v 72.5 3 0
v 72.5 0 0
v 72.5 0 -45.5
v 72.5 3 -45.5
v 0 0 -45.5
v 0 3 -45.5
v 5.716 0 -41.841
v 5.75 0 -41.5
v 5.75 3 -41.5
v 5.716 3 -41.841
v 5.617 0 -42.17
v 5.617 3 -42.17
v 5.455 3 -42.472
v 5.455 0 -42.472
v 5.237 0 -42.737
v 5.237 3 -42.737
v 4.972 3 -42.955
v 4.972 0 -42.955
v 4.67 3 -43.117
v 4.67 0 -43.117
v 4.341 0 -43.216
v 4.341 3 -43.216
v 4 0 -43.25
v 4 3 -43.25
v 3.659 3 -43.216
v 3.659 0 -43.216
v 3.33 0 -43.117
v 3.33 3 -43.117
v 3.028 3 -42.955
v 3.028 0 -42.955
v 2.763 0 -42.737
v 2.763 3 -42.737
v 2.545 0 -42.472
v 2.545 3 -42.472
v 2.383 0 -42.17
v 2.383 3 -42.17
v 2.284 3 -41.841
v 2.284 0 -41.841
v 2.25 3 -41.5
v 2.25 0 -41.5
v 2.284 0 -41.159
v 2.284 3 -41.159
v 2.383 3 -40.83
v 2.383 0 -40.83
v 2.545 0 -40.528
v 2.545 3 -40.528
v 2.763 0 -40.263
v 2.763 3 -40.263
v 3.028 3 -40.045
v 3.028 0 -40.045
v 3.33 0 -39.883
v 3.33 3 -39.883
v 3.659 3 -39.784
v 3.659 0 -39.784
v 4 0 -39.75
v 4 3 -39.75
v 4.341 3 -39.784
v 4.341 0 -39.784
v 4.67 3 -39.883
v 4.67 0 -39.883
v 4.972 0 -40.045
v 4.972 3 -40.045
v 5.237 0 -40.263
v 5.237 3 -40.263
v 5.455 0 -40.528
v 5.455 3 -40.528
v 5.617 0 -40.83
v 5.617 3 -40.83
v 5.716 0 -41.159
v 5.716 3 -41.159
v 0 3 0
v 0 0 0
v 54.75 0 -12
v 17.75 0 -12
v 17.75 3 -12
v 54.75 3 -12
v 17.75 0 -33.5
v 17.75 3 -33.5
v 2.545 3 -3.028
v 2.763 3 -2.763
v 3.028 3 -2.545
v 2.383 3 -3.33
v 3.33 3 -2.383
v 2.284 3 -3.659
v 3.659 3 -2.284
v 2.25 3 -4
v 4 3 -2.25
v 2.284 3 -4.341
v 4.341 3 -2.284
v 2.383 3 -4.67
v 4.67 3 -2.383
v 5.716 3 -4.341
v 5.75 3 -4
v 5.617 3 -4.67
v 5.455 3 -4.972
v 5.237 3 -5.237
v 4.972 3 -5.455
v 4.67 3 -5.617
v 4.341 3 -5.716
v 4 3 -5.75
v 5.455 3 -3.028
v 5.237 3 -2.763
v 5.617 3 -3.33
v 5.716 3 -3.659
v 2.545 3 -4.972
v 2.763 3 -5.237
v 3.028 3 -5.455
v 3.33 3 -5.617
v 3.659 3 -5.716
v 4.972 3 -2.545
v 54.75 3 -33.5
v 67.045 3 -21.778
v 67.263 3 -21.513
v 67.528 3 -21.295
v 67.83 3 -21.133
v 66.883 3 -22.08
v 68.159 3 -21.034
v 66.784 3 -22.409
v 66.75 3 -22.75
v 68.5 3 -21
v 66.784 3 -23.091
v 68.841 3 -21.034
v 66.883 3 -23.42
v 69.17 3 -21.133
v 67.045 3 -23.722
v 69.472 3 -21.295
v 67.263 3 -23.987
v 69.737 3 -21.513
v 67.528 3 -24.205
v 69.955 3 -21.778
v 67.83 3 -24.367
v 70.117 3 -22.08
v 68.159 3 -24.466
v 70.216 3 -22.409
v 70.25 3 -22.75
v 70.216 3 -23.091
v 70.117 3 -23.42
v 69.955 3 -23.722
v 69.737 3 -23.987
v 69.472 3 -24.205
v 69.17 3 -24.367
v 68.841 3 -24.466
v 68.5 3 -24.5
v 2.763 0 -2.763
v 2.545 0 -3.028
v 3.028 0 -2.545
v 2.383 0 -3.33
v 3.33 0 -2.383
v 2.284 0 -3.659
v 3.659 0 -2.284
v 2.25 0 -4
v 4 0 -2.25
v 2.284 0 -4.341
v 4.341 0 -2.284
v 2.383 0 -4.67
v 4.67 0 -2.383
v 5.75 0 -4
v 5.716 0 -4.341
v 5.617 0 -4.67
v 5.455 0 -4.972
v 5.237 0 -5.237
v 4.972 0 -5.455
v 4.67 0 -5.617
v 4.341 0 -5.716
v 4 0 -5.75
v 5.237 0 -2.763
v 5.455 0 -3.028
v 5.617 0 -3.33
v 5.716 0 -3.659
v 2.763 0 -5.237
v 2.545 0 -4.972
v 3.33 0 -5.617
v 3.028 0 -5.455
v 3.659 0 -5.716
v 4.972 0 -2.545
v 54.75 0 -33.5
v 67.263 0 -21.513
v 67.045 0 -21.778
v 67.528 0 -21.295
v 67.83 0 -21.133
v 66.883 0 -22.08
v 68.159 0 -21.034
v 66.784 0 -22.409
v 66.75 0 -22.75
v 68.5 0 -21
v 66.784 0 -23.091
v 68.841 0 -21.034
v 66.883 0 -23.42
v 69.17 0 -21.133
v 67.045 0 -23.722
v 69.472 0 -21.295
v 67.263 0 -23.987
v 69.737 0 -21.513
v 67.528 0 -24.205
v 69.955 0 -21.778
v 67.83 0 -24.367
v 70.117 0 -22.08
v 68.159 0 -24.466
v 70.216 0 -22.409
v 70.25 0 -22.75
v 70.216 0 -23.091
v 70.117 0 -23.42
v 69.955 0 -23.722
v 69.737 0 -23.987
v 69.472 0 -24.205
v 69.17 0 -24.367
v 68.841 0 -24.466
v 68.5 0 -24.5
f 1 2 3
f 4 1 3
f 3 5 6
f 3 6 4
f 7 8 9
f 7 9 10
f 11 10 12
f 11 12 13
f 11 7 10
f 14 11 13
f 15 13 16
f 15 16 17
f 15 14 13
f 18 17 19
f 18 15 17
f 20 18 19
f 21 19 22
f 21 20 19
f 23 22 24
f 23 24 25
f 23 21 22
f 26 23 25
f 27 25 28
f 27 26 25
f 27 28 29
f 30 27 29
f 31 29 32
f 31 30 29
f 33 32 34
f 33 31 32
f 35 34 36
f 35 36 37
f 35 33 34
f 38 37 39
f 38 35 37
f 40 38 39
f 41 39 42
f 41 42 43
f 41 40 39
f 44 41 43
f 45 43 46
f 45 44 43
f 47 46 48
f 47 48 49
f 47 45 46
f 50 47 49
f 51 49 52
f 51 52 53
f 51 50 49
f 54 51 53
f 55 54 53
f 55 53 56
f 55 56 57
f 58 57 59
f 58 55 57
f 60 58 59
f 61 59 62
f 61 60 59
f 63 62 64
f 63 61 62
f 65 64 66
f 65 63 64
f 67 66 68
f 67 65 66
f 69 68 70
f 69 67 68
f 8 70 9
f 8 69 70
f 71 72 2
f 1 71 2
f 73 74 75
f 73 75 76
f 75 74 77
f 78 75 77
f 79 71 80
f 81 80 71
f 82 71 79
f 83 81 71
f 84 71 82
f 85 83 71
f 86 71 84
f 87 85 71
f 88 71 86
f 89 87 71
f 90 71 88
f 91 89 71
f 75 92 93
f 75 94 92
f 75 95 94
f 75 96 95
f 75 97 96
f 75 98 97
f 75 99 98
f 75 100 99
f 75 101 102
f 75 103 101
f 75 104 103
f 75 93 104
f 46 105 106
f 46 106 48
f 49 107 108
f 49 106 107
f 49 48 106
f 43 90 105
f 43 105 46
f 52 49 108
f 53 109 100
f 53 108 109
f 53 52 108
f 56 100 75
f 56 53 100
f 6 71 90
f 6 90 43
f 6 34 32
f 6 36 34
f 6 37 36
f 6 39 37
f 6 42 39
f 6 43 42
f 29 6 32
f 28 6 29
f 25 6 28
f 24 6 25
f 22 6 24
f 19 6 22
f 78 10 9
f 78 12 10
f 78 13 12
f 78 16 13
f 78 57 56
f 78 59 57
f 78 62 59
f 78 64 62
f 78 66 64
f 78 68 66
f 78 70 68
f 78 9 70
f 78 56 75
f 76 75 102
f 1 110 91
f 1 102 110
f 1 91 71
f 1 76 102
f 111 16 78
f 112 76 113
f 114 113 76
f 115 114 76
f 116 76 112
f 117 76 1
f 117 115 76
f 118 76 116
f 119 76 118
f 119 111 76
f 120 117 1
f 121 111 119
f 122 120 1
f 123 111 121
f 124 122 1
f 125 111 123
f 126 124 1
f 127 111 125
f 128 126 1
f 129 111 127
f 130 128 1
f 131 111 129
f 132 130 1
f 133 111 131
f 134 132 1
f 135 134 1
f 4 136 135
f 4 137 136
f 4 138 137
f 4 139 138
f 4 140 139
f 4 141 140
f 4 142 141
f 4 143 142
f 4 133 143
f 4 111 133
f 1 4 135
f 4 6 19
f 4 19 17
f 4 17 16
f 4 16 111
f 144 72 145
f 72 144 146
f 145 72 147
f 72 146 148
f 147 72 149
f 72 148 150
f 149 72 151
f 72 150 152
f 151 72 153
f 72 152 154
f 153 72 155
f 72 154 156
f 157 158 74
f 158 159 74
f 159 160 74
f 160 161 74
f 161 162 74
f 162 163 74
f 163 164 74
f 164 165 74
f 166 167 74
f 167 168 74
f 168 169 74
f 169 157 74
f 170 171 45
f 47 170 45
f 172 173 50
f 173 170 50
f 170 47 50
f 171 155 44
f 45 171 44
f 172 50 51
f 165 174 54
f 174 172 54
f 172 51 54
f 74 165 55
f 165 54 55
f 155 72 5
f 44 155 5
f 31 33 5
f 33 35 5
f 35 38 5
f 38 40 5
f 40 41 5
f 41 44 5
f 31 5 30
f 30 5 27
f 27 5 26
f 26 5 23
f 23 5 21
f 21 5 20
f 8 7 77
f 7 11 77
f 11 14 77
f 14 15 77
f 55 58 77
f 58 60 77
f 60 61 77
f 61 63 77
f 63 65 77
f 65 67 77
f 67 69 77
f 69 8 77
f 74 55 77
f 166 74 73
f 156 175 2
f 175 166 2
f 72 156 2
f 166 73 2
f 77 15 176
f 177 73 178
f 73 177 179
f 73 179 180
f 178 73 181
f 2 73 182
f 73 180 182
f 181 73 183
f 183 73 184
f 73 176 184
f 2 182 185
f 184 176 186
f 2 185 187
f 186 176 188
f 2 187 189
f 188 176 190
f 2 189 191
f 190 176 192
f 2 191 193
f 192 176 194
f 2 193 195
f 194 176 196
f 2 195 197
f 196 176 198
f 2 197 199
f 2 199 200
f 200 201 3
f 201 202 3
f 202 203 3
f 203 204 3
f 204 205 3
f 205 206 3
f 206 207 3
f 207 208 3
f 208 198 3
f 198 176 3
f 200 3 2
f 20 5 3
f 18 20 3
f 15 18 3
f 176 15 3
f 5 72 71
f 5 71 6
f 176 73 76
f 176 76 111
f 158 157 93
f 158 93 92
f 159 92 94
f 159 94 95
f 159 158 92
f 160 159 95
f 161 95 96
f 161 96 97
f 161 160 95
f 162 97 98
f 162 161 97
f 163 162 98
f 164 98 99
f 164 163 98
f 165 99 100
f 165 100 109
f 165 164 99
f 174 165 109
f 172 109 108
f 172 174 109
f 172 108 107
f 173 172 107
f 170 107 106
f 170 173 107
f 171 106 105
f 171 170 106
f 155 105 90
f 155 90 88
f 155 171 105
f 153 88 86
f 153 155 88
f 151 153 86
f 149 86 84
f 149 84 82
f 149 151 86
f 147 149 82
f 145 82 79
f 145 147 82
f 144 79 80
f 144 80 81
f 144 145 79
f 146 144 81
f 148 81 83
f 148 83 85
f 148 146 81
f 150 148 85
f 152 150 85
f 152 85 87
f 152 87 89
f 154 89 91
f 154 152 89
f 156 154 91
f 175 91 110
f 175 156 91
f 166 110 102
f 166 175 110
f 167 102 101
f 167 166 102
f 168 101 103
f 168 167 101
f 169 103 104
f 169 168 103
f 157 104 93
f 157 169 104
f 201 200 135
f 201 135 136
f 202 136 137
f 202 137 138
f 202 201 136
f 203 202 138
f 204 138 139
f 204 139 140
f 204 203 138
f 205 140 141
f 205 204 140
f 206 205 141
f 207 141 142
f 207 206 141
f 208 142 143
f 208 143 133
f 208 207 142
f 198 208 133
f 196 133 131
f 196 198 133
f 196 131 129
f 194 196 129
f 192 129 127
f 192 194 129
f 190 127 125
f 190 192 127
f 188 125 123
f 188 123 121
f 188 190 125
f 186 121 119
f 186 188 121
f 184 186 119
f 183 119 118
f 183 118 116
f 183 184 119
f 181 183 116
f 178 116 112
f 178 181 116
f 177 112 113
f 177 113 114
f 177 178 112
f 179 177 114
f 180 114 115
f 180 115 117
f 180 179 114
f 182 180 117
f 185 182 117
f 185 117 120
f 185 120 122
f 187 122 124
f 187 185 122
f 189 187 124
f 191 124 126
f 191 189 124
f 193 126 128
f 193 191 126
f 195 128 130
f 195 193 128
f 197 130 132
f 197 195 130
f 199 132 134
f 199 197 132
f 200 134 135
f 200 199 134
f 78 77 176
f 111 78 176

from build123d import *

# Parameters (mm, degrees)
SKETCH1_W           = 72.5
SKETCH1_H           = 45.5
SKETCH1_R           = 1.75
SKETCH1_W_2         = 37
SKETCH1_H_2         = 21.5
BOSS_EXTRUDE1_DEPTH = 3


with BuildPart() as part:
    # Sketch1 → Boss-Extrude1 (new body)
    with BuildSketch(Plane(origin=(0, 0, 0), x_dir=(1, 0, 0), z_dir=(0, 1, 0))):
        with Locations((36.25, 22.75)):
            Rectangle(SKETCH1_W, SKETCH1_H)
        with Locations((68.5, 22.75)):
            Circle(SKETCH1_R, mode=Mode.SUBTRACT)
        with Locations((4, 41.5)):
            Circle(SKETCH1_R, mode=Mode.SUBTRACT)
        with Locations((4, 4)):
            Circle(SKETCH1_R, mode=Mode.SUBTRACT)
        with Locations((36.25, 22.75)):
            Rectangle(SKETCH1_W_2, SKETCH1_H_2, mode=Mode.SUBTRACT)
    extrude(amount=BOSS_EXTRUDE1_DEPTH)


solid = part.part
